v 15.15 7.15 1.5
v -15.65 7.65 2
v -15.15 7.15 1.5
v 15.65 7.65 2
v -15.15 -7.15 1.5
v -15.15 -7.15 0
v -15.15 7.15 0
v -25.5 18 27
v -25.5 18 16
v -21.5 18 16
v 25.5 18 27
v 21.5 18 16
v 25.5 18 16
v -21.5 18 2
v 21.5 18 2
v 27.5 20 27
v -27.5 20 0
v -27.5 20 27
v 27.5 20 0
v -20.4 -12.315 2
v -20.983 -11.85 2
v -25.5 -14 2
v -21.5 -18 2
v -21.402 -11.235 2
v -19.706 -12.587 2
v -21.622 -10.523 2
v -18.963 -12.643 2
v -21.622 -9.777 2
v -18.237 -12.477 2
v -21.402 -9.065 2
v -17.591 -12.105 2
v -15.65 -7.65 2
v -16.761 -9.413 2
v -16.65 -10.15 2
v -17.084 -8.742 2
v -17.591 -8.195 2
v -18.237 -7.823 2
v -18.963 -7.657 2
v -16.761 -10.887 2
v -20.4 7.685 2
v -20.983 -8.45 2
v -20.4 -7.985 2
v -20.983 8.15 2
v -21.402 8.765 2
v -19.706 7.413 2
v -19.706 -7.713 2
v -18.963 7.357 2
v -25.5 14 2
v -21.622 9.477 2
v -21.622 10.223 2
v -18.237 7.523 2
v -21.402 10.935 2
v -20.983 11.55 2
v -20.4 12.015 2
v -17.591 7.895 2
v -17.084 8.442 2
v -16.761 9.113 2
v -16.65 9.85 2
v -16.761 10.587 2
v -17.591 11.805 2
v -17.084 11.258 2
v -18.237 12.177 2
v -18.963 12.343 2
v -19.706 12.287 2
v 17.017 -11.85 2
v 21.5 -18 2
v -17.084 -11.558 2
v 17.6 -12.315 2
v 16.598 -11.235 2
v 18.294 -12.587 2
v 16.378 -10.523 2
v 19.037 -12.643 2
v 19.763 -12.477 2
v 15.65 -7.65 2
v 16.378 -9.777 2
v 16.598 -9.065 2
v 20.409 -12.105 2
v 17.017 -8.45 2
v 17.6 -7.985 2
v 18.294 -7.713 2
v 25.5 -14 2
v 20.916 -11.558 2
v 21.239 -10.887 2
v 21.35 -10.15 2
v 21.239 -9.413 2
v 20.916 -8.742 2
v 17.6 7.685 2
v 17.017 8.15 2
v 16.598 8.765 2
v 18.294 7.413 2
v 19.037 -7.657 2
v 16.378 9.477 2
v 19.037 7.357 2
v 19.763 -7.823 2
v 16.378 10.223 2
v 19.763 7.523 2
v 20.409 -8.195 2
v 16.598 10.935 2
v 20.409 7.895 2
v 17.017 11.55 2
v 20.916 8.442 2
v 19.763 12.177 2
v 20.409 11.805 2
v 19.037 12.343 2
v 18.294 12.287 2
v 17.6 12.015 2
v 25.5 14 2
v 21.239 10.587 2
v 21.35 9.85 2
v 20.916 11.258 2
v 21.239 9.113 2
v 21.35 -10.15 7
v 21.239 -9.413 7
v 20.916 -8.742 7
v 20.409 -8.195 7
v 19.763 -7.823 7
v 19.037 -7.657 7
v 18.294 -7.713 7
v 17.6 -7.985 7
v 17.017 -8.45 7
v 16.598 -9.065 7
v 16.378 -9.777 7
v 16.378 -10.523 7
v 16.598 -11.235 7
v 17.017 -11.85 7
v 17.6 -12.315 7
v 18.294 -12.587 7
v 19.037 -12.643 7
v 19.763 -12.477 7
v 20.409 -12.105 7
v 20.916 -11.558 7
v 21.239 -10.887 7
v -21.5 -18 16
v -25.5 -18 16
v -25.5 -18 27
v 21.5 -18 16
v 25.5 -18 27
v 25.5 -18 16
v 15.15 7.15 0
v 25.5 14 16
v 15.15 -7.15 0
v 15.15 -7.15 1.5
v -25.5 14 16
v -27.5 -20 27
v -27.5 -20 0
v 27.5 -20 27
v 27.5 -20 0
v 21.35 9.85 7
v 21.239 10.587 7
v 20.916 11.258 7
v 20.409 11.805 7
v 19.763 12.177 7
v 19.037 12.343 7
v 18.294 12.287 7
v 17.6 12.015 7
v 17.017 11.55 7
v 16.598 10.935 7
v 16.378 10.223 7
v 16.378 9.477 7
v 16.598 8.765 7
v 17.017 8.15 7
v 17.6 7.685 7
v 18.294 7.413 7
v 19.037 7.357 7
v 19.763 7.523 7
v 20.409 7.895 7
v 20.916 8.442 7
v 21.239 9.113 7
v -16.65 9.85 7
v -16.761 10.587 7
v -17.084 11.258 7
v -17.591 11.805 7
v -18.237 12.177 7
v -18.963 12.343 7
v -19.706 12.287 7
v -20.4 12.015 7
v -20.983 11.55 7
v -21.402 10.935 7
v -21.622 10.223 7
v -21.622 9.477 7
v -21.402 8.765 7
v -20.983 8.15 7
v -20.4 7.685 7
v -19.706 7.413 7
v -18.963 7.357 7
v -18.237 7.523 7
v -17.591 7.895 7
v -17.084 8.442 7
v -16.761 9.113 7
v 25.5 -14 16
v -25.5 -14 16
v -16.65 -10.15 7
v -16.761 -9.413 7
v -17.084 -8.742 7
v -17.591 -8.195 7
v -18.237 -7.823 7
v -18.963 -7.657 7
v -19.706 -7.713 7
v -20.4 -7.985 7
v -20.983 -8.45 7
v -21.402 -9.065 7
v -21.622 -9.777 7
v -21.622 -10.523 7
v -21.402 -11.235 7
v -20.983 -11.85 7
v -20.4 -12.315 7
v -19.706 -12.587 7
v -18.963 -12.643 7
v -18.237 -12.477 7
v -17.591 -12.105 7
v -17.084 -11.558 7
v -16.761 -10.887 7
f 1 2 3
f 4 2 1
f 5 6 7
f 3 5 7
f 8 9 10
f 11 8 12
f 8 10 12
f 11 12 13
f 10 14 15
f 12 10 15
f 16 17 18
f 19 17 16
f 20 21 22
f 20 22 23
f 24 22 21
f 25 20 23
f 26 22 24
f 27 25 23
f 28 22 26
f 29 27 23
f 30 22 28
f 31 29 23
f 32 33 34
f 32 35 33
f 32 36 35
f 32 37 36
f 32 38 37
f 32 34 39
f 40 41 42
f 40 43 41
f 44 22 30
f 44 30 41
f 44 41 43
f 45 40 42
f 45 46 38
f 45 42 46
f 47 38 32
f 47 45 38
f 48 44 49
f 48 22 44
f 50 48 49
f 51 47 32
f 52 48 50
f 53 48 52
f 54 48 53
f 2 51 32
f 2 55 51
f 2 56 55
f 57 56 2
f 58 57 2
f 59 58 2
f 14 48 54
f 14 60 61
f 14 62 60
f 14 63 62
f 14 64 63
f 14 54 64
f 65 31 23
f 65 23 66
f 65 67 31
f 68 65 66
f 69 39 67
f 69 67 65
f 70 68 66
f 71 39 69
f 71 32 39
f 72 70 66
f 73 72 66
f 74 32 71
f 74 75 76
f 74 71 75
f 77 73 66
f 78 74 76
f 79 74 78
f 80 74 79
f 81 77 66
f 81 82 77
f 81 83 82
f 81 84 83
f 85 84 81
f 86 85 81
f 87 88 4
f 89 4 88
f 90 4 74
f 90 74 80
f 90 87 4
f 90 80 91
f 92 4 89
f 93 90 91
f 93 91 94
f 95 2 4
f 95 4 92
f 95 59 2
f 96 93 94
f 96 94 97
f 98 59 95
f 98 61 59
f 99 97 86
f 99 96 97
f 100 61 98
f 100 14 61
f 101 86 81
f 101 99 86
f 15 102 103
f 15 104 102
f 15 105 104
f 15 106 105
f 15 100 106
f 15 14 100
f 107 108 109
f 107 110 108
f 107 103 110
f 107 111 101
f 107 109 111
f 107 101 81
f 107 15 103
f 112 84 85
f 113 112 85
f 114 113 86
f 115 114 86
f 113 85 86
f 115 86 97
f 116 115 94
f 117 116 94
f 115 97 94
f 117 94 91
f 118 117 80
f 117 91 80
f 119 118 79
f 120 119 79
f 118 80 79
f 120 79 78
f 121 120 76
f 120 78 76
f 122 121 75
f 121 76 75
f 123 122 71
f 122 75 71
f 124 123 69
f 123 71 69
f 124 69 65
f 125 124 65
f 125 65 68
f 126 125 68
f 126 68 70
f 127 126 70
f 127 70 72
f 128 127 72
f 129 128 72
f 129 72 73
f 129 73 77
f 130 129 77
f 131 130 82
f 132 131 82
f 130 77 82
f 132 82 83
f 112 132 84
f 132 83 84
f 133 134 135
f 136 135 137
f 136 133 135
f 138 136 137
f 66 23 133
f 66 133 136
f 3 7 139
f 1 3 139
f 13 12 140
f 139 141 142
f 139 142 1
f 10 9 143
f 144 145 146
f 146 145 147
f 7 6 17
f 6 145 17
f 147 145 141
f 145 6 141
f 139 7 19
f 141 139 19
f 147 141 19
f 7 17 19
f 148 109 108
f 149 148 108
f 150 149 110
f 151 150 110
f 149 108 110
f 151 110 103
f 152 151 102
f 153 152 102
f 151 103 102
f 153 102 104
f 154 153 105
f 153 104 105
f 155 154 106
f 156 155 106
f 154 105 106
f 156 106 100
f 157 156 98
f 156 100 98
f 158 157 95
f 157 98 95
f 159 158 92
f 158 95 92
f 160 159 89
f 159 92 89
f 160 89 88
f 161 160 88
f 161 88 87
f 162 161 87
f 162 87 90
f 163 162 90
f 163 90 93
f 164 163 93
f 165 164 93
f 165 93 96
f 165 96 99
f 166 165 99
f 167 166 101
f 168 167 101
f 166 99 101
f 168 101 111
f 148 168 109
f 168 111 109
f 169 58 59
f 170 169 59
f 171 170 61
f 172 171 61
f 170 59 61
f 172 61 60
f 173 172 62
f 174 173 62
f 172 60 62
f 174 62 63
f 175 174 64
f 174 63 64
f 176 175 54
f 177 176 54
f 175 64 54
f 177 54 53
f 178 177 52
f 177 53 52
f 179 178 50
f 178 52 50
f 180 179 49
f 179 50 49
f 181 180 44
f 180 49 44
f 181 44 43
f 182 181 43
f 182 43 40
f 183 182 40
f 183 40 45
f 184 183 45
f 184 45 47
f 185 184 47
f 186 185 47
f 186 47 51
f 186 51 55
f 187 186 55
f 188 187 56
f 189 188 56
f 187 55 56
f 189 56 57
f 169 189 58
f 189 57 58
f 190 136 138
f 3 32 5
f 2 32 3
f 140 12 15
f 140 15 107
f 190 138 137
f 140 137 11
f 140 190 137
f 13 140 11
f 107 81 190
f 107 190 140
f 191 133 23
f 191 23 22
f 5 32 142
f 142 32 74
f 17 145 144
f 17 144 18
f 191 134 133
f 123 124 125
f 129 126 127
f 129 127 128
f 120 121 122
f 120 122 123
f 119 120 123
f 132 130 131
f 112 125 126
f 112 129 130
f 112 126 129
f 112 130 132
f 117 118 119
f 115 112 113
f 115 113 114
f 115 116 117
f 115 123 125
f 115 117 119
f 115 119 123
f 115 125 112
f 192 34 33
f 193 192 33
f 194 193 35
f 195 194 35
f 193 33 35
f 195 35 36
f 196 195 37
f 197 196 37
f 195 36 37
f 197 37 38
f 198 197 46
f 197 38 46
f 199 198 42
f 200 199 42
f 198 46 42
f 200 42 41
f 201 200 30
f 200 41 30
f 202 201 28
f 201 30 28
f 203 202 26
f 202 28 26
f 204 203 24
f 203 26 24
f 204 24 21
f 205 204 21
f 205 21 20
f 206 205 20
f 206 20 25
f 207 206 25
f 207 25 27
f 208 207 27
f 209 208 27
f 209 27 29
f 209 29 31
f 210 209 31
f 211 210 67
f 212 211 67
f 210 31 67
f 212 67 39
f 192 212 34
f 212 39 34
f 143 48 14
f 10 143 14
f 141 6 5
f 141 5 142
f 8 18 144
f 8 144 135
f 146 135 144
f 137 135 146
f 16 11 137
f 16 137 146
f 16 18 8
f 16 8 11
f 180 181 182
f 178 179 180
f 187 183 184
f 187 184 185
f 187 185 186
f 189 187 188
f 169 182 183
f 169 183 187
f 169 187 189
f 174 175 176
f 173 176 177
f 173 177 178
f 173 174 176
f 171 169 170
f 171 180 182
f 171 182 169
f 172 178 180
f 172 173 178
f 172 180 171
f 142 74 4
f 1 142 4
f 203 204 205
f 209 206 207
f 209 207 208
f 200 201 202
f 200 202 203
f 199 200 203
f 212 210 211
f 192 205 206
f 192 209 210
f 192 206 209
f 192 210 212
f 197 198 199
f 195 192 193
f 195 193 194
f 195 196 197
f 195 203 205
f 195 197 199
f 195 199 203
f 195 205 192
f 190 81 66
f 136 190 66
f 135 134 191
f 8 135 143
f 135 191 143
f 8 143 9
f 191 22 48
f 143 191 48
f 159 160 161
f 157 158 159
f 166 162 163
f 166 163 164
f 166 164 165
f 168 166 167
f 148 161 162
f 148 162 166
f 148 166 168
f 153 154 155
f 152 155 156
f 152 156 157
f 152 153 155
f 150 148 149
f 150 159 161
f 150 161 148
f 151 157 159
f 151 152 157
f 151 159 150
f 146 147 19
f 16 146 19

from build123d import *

# Parameters (mm, degrees)
F1_W     = 51
F1_H     = 36
F1_W_2   = 30.3
F1_H_2   = 14.3
F2_DEPTH = 2
F3_R     = 2.5
F4_DEPTH = 5
F5_DEPTH = 14
F0_W     = 55
F0_H     = 40
F0_W_2   = 51
F0_H_2   = 36
F6_DEPTH = 27
F7_SIZE  = 0.5


with BuildPart() as f2:
    # F1 (on face) → F2 (new body)
    with BuildSketch(Plane.XY):
        Rectangle(F1_W, F1_H)
        Rectangle(F1_W_2, F1_H_2, mode=Mode.SUBTRACT)
    extrude(amount=F2_DEPTH)

    # F3 (on face) → F4 (join)
    with BuildSketch(Plane.XY.offset(2)):
        with Locations((-19.15, 9.85)):
            Circle(F3_R)
        with Locations((18.85, 9.85)):
            Circle(F3_R)
        with Locations((18.85, -10.15)):
            Circle(F3_R)
        with Locations((-19.15, -10.15)):
            Circle(F3_R)
    extrude(amount=F4_DEPTH)

    # F3 (on face) → F5 (join)
    with BuildSketch(Plane.XY.offset(2)):
        Polygon((-21.5, 18), (-25.5, 18), (-25.5, 14), align=None)
        Polygon((-25.5, -14), (-25.5, -18), (-21.5, -18), align=None)
        Polygon((21.5, -18), (25.5, -18), (25.5, -14), align=None)
        Polygon((25.5, 14), (25.5, 18), (21.5, 18), align=None)
    extrude(amount=F5_DEPTH)

    # F0 (on Top) → F6 (join)
    with BuildSketch(Plane.XY):
        Rectangle(F0_W, F0_H)
        Rectangle(F0_W_2, F0_H_2, mode=Mode.SUBTRACT)
    extrude(amount=F6_DEPTH)

    # F7
    f7_edges = [f2.edges().sort_by_distance(p)[0] for p in [
        (0, 7.15, 2),
        (15.15, 0, 2),
        (0, -7.15, 2),
        (-15.15, 0, 2),
    ]]
    chamfer(f7_edges, length=F7_SIZE)


solid = f2.part
